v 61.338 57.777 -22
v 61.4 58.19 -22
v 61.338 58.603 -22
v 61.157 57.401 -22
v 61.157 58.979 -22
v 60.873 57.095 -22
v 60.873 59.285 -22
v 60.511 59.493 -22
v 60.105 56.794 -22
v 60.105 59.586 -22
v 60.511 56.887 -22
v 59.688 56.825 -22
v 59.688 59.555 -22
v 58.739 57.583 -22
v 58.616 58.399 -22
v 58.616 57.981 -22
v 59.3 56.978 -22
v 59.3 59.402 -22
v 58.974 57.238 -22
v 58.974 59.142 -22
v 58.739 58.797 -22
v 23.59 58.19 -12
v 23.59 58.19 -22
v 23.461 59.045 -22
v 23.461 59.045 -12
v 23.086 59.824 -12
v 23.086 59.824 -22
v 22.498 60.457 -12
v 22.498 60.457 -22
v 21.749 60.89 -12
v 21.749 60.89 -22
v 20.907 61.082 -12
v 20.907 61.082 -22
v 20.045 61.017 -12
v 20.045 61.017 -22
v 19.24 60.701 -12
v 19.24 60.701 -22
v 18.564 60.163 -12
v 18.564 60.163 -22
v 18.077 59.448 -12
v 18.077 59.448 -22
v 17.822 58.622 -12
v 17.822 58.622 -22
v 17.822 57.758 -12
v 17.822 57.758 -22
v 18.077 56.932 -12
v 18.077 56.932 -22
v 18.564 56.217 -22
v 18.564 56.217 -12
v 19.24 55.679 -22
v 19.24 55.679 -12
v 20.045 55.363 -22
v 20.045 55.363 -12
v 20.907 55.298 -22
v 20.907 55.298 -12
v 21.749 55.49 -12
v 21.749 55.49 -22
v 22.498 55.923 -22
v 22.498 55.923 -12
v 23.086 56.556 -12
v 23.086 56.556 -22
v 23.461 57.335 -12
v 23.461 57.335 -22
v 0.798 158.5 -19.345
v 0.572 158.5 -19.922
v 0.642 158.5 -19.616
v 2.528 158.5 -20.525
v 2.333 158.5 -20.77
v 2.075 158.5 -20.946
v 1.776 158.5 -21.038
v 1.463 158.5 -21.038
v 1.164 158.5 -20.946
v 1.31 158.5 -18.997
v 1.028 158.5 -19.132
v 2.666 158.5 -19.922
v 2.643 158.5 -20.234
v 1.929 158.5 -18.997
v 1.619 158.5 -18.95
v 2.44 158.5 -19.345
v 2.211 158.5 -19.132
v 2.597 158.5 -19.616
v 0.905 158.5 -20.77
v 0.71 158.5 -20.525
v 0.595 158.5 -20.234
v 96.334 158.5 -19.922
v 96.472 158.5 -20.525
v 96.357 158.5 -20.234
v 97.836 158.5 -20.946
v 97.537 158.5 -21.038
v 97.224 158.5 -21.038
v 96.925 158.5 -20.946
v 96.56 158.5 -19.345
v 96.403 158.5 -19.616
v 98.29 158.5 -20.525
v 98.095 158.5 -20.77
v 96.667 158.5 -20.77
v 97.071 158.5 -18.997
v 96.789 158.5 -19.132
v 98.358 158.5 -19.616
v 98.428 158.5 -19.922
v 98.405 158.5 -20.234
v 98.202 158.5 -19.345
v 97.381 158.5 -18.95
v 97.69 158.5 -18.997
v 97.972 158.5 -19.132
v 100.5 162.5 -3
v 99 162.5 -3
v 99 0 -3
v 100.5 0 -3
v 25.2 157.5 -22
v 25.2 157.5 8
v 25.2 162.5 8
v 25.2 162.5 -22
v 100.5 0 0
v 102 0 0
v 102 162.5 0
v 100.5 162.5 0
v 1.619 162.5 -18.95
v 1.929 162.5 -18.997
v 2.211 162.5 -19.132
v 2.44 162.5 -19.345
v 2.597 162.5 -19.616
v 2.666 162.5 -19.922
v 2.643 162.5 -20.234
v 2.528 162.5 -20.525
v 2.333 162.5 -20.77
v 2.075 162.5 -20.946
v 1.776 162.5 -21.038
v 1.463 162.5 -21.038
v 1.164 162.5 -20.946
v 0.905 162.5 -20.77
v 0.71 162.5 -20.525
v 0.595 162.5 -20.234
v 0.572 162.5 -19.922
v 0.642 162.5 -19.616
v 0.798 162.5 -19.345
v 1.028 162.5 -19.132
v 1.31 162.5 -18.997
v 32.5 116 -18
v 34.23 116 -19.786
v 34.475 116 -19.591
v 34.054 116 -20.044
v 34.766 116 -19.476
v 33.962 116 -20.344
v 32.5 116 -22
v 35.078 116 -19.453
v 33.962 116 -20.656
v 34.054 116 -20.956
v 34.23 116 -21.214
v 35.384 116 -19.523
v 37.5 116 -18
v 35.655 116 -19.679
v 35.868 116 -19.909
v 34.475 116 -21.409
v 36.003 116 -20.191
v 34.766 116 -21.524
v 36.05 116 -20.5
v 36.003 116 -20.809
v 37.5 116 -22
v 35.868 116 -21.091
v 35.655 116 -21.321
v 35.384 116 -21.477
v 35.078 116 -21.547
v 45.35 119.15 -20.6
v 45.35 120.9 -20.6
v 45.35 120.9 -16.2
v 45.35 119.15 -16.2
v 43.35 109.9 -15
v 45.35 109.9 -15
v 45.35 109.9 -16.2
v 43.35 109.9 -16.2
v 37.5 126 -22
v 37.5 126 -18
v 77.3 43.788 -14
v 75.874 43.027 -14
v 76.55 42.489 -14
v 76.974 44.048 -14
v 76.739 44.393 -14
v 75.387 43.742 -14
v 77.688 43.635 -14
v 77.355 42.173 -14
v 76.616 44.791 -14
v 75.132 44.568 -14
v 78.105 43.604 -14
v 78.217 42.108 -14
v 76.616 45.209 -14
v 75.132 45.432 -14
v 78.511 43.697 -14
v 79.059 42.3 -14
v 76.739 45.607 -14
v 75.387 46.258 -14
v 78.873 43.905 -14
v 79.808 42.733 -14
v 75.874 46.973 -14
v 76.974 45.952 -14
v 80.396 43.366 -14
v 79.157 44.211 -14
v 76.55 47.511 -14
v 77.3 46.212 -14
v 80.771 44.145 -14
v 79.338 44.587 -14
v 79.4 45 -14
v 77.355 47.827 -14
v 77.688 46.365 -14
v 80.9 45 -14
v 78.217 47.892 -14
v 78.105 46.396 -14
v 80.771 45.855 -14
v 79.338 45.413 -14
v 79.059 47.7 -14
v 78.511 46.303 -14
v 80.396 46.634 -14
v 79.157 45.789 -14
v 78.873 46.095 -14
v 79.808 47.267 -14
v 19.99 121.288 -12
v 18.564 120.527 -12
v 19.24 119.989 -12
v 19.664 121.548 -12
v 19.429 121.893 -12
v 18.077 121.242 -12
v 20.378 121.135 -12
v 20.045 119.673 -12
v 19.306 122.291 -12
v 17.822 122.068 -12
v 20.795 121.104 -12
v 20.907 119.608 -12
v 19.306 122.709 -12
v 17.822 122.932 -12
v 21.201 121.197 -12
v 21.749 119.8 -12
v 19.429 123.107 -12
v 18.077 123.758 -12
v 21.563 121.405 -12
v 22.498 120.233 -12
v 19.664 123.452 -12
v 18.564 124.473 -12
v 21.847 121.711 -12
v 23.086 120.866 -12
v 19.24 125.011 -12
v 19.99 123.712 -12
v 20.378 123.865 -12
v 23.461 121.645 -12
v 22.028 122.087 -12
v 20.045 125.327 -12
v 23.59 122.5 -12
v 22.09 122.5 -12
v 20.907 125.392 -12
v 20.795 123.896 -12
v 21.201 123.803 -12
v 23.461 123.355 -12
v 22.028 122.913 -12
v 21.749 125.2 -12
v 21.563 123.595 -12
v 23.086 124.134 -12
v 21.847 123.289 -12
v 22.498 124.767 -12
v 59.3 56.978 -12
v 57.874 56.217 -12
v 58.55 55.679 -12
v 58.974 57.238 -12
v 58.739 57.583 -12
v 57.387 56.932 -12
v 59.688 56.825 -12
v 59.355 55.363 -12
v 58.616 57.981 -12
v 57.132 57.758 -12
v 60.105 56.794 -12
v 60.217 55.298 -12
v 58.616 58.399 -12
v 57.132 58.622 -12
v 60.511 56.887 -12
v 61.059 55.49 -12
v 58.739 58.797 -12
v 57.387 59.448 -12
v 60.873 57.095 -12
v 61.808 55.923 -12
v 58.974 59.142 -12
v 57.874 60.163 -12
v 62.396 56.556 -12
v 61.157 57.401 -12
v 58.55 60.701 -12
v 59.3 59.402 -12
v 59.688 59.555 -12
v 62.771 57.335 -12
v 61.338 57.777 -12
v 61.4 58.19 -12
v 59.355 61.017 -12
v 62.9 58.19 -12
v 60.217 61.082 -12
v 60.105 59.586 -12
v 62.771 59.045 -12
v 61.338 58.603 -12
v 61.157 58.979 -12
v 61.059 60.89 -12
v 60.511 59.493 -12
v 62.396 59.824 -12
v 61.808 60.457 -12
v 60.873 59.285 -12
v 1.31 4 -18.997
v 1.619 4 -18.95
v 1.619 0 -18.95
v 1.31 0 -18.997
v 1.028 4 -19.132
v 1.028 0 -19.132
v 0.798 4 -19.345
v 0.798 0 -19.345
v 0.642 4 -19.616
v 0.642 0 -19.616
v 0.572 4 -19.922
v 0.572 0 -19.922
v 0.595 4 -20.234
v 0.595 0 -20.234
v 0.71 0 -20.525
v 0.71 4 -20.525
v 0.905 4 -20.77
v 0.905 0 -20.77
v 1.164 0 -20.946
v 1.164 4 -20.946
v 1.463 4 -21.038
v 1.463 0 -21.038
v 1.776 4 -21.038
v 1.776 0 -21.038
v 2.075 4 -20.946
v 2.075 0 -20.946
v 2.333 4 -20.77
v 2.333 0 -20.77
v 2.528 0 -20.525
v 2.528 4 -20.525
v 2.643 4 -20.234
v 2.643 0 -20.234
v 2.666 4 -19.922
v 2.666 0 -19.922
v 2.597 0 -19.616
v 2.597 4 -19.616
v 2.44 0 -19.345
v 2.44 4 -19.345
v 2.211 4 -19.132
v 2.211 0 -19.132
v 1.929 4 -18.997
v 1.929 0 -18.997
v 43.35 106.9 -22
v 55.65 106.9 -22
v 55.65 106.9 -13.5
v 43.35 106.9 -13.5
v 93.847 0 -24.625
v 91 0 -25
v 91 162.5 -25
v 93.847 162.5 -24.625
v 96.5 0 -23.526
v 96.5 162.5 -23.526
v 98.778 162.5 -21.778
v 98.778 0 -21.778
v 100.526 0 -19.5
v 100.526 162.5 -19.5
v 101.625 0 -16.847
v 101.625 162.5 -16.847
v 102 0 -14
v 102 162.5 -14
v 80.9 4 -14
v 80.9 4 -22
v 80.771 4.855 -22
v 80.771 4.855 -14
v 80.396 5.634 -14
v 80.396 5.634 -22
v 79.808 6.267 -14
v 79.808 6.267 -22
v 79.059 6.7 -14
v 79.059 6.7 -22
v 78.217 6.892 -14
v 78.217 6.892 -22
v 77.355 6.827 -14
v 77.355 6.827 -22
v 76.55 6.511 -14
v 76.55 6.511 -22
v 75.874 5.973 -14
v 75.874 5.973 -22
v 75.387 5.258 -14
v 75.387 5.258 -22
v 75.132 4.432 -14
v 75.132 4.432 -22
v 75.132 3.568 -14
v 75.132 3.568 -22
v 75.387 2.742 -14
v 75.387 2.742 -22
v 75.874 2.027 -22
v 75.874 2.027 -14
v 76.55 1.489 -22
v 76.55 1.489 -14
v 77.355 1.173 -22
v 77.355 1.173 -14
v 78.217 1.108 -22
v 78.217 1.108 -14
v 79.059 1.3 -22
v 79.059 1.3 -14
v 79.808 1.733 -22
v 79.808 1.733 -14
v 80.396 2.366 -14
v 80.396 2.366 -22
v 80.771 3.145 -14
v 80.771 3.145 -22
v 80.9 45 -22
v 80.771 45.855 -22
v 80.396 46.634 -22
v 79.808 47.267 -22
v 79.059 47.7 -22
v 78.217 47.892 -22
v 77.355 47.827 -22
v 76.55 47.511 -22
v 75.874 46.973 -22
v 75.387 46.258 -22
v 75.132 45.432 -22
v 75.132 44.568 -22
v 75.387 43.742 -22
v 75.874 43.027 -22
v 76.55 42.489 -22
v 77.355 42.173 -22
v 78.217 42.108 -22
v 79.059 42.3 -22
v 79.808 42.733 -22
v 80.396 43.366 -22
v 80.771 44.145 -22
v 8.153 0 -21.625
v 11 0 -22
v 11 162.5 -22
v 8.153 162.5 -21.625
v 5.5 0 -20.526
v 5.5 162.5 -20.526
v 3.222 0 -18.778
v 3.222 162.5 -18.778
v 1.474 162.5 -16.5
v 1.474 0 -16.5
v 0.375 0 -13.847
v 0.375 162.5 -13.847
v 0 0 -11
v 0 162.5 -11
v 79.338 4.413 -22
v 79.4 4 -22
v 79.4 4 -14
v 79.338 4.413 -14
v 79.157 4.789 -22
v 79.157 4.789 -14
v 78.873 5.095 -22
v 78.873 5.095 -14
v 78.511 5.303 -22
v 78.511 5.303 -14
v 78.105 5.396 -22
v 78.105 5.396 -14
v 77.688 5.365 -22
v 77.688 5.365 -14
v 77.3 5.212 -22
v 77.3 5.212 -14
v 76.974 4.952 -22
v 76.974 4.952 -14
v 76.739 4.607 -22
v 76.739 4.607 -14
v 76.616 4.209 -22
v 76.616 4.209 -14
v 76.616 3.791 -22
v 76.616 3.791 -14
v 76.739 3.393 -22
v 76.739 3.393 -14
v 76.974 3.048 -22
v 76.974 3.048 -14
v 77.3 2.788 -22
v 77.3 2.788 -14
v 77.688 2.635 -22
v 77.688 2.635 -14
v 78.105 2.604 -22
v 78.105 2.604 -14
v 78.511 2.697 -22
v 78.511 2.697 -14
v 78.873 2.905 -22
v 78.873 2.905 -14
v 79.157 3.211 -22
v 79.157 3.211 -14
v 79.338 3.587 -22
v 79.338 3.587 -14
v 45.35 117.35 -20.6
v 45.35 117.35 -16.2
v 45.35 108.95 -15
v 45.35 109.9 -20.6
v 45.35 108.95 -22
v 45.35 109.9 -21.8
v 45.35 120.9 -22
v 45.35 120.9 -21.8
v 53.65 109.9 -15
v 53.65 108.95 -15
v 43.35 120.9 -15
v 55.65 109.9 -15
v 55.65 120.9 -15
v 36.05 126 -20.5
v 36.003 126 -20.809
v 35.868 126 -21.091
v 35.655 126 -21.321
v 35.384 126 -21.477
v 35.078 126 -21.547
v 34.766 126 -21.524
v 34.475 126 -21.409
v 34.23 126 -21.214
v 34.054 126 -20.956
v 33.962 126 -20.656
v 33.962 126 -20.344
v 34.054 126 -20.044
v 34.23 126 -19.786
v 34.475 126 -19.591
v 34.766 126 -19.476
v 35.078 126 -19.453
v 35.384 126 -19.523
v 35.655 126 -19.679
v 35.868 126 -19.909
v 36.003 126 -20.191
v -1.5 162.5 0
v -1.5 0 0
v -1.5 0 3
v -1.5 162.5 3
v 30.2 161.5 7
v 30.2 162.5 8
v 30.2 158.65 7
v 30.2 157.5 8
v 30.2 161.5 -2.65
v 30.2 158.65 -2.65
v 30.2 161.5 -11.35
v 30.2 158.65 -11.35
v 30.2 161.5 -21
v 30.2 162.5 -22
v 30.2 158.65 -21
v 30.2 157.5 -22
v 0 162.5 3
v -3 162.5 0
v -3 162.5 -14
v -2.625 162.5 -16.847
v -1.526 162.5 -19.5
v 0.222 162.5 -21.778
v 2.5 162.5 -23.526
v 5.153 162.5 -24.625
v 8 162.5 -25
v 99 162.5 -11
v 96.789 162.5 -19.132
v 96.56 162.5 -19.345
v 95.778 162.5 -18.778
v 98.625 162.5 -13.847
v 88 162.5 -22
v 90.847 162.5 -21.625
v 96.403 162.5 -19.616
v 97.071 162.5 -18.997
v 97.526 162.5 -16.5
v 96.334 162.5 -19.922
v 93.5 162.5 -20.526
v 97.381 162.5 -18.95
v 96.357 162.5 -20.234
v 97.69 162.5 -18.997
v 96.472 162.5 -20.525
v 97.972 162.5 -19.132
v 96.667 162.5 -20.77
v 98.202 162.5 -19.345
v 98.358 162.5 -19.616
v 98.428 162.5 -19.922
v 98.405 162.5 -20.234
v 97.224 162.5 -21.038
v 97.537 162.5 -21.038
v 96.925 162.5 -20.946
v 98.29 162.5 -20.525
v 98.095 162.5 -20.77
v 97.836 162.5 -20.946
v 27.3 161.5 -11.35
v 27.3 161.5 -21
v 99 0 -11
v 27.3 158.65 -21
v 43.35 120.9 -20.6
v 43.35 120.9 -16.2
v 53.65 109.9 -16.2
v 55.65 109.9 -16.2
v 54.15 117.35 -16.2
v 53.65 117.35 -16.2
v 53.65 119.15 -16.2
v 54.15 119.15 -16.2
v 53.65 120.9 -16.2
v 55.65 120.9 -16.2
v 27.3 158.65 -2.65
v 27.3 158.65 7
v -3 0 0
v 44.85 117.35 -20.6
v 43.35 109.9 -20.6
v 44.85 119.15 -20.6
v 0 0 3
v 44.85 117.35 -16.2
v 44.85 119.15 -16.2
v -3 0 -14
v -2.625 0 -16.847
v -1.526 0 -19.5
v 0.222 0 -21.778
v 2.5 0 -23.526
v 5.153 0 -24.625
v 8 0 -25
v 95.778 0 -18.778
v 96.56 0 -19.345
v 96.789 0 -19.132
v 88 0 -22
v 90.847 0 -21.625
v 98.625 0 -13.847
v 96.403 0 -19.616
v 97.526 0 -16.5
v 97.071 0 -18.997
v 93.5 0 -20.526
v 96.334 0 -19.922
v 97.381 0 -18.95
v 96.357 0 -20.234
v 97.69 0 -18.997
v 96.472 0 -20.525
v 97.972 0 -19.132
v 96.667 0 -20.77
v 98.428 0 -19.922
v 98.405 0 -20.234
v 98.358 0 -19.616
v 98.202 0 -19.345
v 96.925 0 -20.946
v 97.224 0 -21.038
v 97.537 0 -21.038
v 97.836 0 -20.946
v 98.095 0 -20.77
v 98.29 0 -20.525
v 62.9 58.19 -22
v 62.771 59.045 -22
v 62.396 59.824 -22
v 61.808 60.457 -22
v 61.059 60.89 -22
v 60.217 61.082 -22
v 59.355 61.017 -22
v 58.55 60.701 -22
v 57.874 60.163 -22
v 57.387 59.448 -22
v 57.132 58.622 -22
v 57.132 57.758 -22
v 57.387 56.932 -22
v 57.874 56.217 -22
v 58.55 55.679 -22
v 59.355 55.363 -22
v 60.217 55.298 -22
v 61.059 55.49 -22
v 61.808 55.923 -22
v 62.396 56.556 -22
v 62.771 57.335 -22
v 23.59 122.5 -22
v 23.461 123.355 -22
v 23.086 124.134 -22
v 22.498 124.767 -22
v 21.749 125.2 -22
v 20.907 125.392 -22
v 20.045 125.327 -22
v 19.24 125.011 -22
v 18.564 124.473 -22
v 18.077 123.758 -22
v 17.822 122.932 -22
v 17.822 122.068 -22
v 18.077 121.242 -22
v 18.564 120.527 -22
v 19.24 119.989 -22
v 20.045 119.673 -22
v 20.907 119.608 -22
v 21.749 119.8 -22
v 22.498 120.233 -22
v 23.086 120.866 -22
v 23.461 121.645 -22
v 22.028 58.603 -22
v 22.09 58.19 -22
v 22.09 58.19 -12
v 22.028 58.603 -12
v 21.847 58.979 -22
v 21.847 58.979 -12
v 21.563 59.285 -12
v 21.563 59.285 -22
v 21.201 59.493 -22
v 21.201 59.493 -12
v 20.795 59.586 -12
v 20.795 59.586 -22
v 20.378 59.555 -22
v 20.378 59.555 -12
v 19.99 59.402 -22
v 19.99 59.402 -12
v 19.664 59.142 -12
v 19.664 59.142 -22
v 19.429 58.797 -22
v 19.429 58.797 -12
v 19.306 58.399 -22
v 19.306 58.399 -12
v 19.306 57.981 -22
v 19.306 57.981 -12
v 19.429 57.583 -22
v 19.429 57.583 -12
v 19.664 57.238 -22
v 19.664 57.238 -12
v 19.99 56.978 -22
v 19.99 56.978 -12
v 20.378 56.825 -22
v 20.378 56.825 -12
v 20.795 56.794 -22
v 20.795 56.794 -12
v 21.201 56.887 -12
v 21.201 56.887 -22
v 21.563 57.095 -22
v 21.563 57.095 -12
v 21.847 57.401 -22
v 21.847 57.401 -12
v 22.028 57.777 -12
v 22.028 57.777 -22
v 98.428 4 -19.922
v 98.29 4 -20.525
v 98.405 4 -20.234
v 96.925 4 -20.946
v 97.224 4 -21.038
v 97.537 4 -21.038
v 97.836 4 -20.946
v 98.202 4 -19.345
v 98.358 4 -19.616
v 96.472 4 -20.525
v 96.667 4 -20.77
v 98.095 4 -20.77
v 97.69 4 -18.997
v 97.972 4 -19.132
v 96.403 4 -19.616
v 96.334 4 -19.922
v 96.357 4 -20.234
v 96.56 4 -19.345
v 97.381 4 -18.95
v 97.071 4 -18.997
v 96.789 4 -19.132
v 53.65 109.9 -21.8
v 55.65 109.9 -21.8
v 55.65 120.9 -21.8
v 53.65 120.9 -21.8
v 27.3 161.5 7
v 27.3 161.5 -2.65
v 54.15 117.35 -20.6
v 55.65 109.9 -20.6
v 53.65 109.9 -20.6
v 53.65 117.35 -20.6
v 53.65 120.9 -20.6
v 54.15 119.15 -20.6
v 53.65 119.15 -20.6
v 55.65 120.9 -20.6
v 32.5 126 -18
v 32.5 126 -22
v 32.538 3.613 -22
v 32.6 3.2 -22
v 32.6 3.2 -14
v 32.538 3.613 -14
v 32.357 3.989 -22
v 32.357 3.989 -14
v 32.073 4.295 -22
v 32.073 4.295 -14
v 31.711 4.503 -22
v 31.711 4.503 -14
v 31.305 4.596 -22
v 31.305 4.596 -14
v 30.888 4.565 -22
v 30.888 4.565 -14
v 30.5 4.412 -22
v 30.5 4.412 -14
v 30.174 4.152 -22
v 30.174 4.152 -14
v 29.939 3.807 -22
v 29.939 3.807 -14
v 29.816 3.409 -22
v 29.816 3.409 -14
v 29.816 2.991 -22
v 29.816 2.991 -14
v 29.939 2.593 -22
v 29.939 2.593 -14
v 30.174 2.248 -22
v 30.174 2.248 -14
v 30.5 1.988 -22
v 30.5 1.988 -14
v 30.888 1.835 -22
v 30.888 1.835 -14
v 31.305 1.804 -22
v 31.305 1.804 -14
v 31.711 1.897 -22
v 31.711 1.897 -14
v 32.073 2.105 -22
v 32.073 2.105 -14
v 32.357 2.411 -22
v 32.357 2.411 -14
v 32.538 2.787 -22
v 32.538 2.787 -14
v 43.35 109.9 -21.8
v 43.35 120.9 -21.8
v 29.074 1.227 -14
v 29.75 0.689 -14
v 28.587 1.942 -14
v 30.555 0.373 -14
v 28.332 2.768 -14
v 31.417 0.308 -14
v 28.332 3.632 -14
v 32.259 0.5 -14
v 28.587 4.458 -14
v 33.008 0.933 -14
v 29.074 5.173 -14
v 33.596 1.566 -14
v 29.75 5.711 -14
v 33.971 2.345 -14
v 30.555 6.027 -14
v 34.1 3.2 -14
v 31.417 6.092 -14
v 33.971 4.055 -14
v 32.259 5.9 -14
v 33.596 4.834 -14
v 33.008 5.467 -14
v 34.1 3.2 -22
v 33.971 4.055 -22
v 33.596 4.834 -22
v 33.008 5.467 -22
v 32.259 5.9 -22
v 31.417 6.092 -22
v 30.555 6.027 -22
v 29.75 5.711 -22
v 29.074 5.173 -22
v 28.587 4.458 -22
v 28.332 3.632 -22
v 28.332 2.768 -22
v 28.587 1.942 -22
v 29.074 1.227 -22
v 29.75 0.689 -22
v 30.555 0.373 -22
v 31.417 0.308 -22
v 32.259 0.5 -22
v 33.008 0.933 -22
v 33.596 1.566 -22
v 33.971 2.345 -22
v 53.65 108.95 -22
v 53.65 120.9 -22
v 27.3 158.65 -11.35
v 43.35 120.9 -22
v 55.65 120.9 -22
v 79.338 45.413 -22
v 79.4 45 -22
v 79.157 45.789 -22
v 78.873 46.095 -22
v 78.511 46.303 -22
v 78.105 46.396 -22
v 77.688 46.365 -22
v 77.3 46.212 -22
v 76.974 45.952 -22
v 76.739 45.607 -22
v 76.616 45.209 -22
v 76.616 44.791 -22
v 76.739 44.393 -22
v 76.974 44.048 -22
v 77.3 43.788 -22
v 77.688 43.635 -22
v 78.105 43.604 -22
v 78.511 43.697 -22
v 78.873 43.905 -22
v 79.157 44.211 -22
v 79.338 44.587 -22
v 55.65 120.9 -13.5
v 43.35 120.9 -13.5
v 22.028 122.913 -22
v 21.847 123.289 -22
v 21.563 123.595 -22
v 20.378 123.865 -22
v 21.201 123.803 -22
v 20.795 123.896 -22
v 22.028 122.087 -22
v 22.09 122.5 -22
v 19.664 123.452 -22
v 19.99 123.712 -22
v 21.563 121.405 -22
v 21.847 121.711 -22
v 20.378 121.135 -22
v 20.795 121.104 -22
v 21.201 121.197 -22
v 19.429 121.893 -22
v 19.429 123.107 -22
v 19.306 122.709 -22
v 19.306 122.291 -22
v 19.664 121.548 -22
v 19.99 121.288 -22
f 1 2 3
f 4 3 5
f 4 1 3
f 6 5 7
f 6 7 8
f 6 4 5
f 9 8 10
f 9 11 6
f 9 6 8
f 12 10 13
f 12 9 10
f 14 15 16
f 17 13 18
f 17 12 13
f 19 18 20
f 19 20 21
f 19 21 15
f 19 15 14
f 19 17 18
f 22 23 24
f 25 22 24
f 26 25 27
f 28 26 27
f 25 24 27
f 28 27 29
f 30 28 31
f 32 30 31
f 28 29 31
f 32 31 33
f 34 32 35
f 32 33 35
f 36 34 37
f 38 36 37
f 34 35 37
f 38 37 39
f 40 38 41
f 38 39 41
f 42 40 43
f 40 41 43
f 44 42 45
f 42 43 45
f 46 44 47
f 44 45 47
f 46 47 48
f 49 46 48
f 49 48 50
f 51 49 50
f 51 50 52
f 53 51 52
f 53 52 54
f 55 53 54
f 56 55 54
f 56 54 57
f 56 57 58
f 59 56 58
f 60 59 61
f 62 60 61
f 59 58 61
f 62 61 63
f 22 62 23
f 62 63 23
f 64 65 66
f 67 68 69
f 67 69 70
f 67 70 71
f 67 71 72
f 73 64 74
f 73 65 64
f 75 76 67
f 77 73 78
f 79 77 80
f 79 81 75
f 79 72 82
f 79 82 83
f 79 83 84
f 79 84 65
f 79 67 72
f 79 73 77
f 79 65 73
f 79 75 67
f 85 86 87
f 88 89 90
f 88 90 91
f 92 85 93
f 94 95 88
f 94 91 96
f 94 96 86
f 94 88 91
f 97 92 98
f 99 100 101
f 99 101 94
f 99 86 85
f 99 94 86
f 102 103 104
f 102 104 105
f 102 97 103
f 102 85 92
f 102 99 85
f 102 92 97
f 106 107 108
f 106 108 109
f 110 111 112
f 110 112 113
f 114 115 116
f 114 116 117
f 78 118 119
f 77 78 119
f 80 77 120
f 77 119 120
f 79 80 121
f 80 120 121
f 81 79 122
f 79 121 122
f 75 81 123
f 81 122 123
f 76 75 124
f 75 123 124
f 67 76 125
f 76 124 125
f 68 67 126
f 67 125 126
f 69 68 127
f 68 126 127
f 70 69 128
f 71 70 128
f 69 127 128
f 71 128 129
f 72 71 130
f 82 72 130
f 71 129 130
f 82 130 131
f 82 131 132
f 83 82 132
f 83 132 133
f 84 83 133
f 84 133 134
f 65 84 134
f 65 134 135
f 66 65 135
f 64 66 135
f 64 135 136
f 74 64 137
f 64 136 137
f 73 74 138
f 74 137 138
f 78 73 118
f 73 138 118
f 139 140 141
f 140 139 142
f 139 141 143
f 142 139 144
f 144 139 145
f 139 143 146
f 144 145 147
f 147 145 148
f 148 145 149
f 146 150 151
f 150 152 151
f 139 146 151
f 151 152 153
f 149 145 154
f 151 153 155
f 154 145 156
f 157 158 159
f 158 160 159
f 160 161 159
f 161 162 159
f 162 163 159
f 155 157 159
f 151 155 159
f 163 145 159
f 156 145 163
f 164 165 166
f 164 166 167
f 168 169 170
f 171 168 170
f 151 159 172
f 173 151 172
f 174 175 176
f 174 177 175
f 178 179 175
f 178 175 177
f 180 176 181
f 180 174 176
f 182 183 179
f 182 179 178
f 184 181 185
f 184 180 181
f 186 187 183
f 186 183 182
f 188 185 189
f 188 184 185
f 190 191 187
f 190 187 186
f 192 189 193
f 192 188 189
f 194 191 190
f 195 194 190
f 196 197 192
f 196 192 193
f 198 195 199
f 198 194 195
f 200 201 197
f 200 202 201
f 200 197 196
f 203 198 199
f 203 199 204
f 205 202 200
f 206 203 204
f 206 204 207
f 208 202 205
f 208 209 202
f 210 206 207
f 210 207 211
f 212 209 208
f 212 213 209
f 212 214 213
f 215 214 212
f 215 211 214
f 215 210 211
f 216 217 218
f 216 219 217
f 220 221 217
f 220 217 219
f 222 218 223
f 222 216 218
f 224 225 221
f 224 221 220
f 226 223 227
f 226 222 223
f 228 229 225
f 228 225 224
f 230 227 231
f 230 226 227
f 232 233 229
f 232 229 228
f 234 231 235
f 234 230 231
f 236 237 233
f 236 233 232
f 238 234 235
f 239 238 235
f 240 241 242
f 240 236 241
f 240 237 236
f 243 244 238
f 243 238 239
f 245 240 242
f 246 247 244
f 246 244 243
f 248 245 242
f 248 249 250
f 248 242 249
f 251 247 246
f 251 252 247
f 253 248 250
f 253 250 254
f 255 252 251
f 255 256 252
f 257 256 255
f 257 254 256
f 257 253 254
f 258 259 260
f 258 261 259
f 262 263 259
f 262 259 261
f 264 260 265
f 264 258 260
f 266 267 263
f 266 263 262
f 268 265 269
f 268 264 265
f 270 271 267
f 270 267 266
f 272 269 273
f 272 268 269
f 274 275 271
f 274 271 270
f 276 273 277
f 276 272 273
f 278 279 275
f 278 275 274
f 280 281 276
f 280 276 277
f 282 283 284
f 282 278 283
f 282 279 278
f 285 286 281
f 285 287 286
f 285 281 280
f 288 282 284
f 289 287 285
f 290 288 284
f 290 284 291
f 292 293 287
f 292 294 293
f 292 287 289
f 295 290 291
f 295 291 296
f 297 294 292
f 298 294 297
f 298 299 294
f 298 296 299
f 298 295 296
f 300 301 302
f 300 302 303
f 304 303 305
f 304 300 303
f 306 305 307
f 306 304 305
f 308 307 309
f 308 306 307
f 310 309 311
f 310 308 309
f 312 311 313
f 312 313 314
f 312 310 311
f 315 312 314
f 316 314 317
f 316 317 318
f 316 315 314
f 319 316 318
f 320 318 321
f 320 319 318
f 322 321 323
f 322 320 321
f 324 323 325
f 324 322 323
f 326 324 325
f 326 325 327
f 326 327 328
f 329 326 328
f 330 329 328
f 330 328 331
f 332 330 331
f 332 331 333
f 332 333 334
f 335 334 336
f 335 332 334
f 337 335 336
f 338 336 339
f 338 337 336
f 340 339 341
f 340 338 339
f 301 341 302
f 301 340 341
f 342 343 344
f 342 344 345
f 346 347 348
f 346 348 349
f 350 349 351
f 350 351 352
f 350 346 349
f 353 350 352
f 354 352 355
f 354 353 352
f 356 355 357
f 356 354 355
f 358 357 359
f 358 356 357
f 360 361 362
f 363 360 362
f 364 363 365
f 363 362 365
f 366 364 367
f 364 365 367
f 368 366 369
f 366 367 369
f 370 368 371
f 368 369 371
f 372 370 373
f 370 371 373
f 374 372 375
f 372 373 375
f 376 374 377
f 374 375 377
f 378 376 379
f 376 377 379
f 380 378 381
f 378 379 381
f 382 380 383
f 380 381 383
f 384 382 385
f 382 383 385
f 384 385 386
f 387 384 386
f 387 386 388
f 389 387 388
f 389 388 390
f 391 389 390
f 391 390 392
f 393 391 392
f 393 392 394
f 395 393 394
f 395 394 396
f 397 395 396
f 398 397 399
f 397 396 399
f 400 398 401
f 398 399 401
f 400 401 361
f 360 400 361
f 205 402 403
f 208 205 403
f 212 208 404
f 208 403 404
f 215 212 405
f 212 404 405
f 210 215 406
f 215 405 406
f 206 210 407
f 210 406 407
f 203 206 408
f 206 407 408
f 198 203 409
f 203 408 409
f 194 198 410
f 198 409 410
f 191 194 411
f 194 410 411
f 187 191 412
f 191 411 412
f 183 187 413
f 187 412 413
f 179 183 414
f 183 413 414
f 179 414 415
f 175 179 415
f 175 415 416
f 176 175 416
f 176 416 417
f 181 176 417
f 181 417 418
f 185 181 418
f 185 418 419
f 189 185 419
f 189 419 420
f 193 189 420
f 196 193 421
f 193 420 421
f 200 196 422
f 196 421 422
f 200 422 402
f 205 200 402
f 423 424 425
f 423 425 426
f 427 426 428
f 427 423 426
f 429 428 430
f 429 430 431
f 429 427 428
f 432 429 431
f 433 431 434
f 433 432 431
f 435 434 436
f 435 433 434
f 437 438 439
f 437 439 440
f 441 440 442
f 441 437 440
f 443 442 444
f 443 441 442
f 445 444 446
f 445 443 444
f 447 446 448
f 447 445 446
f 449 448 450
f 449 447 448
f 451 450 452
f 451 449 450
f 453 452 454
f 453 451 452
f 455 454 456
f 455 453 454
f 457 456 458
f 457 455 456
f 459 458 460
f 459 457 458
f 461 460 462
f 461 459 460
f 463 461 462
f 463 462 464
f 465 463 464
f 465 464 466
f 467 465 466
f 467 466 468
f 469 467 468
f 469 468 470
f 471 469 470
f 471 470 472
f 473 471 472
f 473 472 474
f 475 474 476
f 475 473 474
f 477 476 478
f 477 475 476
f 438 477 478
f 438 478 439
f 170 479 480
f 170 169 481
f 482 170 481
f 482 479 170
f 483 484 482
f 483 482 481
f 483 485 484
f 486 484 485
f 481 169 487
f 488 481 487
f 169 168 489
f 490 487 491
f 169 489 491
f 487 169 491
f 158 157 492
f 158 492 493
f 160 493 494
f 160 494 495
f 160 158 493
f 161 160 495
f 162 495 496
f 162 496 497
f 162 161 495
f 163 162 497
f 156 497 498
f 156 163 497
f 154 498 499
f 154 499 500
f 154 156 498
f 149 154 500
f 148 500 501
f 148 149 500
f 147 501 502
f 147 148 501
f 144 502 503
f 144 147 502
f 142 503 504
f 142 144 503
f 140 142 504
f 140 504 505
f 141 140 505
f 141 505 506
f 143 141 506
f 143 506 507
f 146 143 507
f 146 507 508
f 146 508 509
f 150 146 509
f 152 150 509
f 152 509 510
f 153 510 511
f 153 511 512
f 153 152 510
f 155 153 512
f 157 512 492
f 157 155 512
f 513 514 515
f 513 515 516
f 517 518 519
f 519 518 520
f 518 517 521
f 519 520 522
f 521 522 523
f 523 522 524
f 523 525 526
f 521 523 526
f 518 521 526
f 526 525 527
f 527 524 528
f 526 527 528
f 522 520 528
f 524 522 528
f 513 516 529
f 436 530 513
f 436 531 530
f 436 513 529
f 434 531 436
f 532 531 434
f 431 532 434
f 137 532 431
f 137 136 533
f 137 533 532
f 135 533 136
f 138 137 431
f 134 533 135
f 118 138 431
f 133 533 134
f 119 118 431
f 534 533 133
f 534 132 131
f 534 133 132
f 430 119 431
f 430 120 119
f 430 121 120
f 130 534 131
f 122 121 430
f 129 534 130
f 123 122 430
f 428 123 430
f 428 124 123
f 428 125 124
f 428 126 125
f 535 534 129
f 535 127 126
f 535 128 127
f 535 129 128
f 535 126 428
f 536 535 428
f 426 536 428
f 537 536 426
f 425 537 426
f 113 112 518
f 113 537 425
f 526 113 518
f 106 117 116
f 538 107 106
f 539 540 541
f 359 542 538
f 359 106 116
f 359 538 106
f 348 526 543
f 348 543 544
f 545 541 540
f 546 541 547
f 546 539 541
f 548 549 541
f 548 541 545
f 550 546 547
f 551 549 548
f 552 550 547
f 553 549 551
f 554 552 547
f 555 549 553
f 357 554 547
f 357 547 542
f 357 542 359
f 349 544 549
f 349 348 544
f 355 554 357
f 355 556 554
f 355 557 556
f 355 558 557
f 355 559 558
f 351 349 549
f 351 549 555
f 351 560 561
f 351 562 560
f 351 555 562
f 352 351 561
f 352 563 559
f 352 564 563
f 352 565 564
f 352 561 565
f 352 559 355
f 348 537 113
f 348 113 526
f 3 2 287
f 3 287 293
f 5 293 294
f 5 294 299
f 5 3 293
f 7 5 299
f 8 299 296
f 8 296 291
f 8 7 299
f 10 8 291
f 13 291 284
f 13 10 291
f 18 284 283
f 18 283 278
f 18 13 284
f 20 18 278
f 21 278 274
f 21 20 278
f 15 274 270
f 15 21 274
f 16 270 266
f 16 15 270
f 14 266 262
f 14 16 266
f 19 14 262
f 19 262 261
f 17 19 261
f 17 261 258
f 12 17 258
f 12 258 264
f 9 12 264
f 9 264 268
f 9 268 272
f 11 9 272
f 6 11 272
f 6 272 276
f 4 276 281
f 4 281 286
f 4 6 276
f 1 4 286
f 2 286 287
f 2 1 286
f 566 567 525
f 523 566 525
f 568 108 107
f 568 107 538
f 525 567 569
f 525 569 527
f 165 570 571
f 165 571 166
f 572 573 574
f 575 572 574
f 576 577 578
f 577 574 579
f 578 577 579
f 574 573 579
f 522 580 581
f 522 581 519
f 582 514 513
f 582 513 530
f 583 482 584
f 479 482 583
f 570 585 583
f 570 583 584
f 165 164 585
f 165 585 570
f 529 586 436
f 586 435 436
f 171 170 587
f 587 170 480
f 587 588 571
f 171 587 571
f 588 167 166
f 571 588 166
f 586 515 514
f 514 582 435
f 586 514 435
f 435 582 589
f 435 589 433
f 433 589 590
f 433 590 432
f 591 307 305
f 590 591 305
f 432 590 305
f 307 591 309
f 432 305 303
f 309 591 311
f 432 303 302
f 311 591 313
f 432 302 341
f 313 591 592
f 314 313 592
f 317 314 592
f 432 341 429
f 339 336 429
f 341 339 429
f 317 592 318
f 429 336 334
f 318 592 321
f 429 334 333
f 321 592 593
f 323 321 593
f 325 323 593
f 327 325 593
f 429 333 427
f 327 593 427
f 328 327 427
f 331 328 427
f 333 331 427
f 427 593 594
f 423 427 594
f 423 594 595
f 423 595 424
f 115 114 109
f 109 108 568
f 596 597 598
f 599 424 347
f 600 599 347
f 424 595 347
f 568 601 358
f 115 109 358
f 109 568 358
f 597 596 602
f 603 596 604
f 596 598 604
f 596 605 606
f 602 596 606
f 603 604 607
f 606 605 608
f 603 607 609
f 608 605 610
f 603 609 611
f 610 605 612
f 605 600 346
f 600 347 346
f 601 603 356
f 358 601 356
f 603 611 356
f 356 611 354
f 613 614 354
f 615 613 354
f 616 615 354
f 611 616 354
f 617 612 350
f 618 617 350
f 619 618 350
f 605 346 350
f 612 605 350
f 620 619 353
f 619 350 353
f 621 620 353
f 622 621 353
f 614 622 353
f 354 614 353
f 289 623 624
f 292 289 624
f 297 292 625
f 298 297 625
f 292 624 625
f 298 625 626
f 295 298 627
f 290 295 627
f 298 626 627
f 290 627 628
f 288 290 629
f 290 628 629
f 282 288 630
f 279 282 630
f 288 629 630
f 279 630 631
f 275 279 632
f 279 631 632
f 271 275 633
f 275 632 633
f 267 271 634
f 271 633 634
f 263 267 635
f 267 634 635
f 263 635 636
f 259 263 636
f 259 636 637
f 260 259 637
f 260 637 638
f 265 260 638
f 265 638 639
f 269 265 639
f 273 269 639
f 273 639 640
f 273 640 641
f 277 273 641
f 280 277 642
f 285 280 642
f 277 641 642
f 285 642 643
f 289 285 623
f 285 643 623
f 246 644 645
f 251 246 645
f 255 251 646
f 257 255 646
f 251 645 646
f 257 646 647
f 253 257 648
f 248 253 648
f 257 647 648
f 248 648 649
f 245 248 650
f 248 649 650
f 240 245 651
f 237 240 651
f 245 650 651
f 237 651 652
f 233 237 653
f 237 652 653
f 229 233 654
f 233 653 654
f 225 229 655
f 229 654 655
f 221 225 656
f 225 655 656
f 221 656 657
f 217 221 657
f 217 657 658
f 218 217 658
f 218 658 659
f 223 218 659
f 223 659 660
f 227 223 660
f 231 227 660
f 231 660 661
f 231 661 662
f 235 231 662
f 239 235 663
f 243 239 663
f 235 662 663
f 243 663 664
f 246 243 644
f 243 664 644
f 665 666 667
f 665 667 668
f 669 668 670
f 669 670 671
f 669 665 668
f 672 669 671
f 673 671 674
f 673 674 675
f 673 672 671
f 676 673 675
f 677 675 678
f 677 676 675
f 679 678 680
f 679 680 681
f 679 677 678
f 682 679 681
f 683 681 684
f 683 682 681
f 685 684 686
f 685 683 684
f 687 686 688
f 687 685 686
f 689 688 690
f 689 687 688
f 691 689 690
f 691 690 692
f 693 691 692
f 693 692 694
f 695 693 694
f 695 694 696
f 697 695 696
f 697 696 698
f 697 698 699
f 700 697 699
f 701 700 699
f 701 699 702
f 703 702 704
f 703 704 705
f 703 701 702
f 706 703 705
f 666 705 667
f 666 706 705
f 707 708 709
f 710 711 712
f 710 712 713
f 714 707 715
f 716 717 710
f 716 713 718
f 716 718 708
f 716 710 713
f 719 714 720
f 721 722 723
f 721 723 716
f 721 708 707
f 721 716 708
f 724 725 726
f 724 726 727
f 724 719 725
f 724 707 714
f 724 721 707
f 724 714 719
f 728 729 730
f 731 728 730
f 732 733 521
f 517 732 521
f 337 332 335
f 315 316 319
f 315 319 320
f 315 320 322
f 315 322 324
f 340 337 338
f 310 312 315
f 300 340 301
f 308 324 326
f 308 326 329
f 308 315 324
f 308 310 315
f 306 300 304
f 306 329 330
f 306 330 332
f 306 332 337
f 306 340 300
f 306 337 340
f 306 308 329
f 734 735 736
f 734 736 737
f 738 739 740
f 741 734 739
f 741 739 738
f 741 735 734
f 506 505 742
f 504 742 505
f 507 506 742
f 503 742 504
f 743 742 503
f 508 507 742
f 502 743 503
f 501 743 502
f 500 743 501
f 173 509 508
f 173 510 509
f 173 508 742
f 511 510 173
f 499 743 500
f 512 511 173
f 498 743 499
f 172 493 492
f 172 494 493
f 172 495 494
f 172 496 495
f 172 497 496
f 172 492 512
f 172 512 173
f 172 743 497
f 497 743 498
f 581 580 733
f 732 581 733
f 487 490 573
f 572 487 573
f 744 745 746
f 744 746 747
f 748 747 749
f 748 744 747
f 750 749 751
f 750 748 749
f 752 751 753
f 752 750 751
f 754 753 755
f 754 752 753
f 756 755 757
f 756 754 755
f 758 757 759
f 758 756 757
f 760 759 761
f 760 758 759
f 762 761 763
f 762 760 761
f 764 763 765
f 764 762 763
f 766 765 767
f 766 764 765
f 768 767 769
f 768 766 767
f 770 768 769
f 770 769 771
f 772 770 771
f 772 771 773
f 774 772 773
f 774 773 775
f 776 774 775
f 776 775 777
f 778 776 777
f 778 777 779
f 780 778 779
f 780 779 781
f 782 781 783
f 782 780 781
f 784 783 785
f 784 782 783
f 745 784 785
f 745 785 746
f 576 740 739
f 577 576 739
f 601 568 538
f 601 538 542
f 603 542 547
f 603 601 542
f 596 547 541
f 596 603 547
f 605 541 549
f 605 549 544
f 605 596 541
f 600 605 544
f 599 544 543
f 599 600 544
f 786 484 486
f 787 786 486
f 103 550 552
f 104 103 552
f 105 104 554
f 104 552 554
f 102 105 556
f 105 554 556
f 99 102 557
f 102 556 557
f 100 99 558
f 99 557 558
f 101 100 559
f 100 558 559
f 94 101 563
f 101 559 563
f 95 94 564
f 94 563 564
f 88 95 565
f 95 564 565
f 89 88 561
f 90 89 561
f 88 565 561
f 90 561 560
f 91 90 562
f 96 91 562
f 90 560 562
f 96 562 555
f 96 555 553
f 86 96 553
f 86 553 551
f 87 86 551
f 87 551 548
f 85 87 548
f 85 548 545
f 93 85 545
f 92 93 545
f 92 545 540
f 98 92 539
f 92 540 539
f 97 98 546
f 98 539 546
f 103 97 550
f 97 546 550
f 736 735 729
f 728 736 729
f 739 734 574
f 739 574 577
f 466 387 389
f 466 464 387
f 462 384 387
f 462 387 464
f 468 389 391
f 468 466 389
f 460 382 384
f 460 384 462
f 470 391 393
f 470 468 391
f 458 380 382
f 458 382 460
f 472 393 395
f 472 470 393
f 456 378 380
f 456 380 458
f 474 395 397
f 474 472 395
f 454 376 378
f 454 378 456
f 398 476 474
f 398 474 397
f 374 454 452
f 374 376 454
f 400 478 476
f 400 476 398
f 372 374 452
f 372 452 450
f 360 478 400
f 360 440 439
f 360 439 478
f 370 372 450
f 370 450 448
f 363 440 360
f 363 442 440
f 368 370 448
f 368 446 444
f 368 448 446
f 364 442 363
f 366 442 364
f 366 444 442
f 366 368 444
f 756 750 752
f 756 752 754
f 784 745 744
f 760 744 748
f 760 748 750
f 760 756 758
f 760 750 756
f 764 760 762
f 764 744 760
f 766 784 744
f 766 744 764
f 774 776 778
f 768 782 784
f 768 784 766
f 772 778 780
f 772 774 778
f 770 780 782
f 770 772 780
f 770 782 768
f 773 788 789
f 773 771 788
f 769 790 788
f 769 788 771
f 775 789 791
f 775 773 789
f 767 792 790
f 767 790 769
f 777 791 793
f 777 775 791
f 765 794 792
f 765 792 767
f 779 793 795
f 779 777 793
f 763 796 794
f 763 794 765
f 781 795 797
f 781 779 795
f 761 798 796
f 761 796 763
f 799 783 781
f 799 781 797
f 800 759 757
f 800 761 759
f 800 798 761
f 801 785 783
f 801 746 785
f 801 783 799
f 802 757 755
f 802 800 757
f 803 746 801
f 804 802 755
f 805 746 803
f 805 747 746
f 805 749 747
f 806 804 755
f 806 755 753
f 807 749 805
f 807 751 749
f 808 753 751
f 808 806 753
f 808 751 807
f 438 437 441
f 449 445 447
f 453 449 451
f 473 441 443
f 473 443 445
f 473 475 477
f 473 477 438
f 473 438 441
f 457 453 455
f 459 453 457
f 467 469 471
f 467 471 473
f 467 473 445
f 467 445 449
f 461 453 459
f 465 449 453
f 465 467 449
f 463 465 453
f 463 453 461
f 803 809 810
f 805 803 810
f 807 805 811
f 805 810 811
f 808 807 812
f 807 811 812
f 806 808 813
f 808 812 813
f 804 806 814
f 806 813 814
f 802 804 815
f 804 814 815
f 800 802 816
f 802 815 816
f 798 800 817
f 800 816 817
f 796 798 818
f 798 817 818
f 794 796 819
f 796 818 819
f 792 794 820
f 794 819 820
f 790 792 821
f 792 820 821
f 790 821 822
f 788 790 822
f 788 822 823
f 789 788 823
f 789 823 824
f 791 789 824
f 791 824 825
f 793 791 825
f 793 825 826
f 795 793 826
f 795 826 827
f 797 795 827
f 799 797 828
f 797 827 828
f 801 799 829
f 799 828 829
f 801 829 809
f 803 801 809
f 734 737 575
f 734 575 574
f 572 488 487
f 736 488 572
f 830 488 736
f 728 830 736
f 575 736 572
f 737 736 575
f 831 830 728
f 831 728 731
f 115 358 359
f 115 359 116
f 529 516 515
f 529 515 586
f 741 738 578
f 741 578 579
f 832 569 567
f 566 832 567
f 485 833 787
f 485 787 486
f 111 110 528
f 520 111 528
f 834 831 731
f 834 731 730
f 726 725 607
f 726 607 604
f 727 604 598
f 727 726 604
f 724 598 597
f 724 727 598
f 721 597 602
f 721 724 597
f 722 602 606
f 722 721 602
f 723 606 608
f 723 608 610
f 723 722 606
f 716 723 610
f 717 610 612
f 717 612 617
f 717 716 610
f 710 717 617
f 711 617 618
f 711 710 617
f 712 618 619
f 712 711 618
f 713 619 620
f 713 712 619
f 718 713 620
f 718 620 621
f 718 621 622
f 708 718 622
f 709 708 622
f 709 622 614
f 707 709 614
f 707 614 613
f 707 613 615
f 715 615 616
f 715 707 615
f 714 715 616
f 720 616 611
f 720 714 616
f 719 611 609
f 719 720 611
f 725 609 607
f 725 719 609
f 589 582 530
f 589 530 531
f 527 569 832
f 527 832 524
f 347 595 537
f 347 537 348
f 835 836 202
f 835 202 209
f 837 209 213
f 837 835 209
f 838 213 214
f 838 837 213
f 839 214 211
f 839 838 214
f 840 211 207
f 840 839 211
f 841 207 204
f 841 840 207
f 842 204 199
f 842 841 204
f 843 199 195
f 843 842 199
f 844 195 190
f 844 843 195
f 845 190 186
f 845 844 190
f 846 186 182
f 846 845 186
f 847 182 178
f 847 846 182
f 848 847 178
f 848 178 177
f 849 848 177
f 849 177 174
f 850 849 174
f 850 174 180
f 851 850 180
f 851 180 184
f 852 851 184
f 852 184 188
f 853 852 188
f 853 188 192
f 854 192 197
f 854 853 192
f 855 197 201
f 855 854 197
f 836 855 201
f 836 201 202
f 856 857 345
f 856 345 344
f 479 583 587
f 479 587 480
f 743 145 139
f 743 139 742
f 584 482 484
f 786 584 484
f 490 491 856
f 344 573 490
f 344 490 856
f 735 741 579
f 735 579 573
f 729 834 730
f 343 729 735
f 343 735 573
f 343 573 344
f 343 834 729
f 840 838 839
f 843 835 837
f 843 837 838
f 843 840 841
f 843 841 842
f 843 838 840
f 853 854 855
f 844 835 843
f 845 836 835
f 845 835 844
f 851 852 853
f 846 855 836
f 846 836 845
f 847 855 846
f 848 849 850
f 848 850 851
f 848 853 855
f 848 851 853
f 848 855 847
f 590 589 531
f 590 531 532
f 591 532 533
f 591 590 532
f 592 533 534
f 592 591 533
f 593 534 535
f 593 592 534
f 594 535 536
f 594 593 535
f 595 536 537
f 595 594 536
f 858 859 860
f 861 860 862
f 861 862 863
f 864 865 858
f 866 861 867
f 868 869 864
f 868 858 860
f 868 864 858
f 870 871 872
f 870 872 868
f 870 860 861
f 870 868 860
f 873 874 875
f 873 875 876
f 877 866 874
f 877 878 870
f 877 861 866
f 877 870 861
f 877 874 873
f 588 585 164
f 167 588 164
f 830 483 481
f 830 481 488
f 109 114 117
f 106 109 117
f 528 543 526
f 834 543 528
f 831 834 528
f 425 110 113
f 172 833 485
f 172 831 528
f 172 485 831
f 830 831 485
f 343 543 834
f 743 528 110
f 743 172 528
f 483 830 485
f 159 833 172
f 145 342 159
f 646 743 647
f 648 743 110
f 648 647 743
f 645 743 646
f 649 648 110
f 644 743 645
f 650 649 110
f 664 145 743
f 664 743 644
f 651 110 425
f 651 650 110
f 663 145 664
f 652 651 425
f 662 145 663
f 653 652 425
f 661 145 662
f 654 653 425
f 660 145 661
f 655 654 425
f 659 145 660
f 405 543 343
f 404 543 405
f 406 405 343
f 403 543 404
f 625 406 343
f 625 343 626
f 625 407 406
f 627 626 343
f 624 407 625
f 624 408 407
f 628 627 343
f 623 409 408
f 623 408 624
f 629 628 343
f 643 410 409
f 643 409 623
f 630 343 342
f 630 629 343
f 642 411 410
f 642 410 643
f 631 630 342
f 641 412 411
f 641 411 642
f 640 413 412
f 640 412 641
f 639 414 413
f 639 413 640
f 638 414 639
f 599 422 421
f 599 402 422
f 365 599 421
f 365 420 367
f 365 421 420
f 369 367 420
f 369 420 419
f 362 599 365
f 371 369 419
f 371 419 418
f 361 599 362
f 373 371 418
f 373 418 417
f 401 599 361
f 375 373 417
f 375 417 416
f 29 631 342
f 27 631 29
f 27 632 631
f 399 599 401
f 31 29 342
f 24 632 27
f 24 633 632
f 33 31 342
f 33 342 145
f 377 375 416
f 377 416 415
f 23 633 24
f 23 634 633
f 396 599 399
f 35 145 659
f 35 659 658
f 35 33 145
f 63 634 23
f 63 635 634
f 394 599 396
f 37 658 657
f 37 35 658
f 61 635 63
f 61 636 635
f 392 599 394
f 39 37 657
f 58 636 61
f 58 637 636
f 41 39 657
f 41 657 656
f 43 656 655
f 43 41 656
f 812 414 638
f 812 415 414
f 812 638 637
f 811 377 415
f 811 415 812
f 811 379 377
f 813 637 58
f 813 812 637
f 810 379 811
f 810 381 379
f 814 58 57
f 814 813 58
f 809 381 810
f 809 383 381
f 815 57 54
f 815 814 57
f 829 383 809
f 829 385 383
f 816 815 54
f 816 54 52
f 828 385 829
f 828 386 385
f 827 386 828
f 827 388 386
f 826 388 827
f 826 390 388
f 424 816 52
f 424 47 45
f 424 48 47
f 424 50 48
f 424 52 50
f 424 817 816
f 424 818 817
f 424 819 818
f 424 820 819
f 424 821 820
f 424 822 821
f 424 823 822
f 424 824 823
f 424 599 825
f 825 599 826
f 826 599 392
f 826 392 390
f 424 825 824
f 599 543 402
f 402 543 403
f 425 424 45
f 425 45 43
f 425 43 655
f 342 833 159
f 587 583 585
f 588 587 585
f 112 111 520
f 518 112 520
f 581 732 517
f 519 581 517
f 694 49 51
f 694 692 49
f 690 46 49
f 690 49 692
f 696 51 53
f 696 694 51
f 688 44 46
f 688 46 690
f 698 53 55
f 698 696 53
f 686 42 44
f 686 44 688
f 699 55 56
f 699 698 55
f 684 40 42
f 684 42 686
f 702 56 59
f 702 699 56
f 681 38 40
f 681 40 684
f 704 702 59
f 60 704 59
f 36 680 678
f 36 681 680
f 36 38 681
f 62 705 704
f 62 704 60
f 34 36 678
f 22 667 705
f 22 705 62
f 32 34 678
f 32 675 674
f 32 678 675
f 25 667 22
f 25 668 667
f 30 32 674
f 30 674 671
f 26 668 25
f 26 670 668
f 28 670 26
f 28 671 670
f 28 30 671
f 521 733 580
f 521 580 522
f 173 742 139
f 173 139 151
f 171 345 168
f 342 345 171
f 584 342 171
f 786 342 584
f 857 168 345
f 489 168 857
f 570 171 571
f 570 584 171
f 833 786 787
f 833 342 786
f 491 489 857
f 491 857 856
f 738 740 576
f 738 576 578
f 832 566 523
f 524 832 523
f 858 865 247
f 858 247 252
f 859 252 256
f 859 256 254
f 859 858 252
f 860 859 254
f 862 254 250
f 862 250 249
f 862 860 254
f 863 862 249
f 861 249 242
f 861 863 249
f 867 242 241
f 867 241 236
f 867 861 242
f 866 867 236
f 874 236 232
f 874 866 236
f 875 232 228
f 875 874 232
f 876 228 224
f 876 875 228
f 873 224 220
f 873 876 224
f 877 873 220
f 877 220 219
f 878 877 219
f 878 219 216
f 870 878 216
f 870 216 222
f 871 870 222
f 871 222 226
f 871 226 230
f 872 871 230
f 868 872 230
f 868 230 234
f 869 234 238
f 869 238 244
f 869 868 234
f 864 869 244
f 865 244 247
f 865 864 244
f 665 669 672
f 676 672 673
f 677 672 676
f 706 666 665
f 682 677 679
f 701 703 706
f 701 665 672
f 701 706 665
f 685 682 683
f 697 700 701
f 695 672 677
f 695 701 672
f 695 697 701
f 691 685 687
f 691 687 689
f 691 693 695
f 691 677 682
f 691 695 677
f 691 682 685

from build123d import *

# Parameters (mm, degrees)
EXTRUDE_1_DEPTH       = 162.5
SKETCH_2_W            = 1.5
SKETCH_2_H            = 162.5
EXTRUDE_2_DEPTH       = 3
SKETCH_2_4_W          = 1.5
SKETCH_2_4_H          = 162.5
CUT_EXTRUDE_2_DEPTH   = 3
SKETCH_3_R            = 1.05
CUT_EXTRUDE_3_DEPTH   = 4
CUT_EXTRUDE_START     = -4
SKETCH_4_R            = 1.05
CUT_EXTRUDE_4_DEPTH   = 4
SKETCH_6_R            = 2.9
SKETCH_6_R_2          = 1.4
EXTRUDE_1_2_DEPTH     = 10
SKETCH_7_R            = 2.9
SKETCH_7_R_2          = 1.4
EXTRUDE_2_2_DEPTH     = 8
EXTRUDE_4_DEPTH       = 8.5
CUT_EXTRUDE_6_REACH   = 176.56
SKETCH_13_W           = 1.2
SKETCH_13_H           = 11
EXTRUDE_START         = 1.4
EXTRUDE_5_OUTLINE_W   = 0.5
EXTRUDE_5_OUTLINE_H   = 1.8
EXTRUDE_5_DEPTH       = 4.4
EXTRUDE_5_2_OUTLINE_W = 5
EXTRUDE_5_2_OUTLINE_H = 10
EXTRUDE_5_2_DEPTH     = 4
EXTRUDE_START_2       = 116
EXTRUDE_6_OUTLINE_R   = 1.05
EXTRUDE_6_DEPTH       = 10
EXTRUDE_START_3       = 157.5
EXTRUDE_6_2_OUTLINE_W = 5
EXTRUDE_6_2_OUTLINE_H = 30
EXTRUDE_6_2_DEPTH     = 5
EXTRUDE_START_4       = -7.5
EXTRUDE_7_OUTLINE_W   = 2.9
EXTRUDE_7_OUTLINE_H   = 2.85
EXTRUDE_7_DEPTH       = 9.65
EXTRUDE_START_5       = 10.85
EXTRUDE_7_2_OUTLINE_W = 2.9
EXTRUDE_7_2_OUTLINE_H = 2.85
EXTRUDE_7_2_DEPTH     = 9.65
EXTRUDE_START_6       = -1.5
EXTRUDE_7_3_OUTLINE_W = 8.3
EXTRUDE_7_3_OUTLINE_H = 11.95
EXTRUDE_7_3_DEPTH     = 1.5


# Read off the part's stored shape, not the designer's step: 凸台-拉伸5, 凸台-拉伸6, 凸台-拉伸7
with BuildPart() as part:
    # 草图1 → Extrude 1 (new body)
    with BuildSketch(Plane(origin=(0, 0, 0), x_dir=(1, 0, 0), z_dir=(0, 1, 0))):
        with BuildLine():
            Line((-3, 0), (-3, 14))
            ThreePointArc((-3, 14), (0.221825407, 21.778174593), (8, 25))
            Line((8, 25), (91, 25))
            ThreePointArc((91, 25), (98.778174593, 21.778174593), (102, 14))
            Line((102, 14), (102, 0))
            Line((102, 0), (99, 0))
            Line((99, 0), (99, 11))
            ThreePointArc((99, 11), (95.778174593, 18.778174593), (88, 22))
            Line((88, 22), (11, 22))
            ThreePointArc((11, 22), (3.221825407, 18.778174593), (0, 11))
            Line((0, 11), (0, 0))
            Line((0, 0), (-3, 0))
        make_face()
    extrude(amount=EXTRUDE_1_DEPTH)

    # 草图2 → Extrude 2 (add)
    with BuildSketch(Plane.XY):
        with Locations((-0.75, 81.25)):
            Rectangle(SKETCH_2_W, SKETCH_2_H)
    extrude(amount=EXTRUDE_2_DEPTH)

    # 草图2<4> → 切除-拉伸2 (cut)
    with BuildSketch(Plane.XY):
        with Locations((99.75, 81.25)):
            Rectangle(SKETCH_2_4_W, SKETCH_2_4_H)
    extrude(amount=-CUT_EXTRUDE_2_DEPTH, mode=Mode.SUBTRACT)

    # 草图3 → 切除-拉伸3 (cut)
    with BuildSketch(Plane(origin=(0, 162.5, 0), x_dir=(1, 0, 0), z_dir=(0, 1, 0))):
        with Locations(Location((1.61916848, 20, 0), (0, 0, 270))):
            Circle(SKETCH_3_R)
        with Locations(Location((97.38083152, 20, 0), (0, 0, 270))):
            Circle(SKETCH_3_R)
    extrude(amount=-CUT_EXTRUDE_3_DEPTH, mode=Mode.SUBTRACT)

    # 草图4 → 切除-拉伸4 (cut)
    with BuildSketch(Plane.XZ.offset(CUT_EXTRUDE_START)):
        with Locations(Location((1.61916848, -20, 0), (0, 0, 90))):
            Circle(SKETCH_4_R)
        with Locations(Location((97.38083152, -20, 0), (0, 0, 90))):
            Circle(SKETCH_4_R)
    extrude(amount=CUT_EXTRUDE_4_DEPTH, mode=Mode.SUBTRACT)

    # 草图6 → Extrude 1 2 (add)
    # profile 1 of 3: a face of its own
    with BuildSketch(Plane.XY.offset(-22)):
        with Locations((20.69, 122.5)):
            Circle(SKETCH_6_R)
        with Locations((20.69, 122.5)):
            Circle(SKETCH_6_R_2, mode=Mode.SUBTRACT)
    # profile 2 of 3: a face of its own
    with BuildSketch(Plane.XY.offset(-22)):
        with Locations((20.69, 58.19)):
            Circle(SKETCH_6_R)
        with Locations((20.69, 58.19)):
            Circle(SKETCH_6_R_2, mode=Mode.SUBTRACT)
    # profile 3 of 3: a face of its own
    with BuildSketch(Plane.XY.offset(-22)):
        with Locations((60, 58.19)):
            Circle(SKETCH_6_R)
        with Locations((60, 58.19)):
            Circle(SKETCH_6_R_2, mode=Mode.SUBTRACT)
    extrude(amount=EXTRUDE_1_2_DEPTH)

    # 草图7 → Extrude 2 2 (add)
    # profile 1 of 3: a face of its own
    with BuildSketch(Plane.XY.offset(-22)):
        with Locations((78, 4)):
            Circle(SKETCH_7_R)
        with Locations((78, 4)):
            Circle(SKETCH_7_R_2, mode=Mode.SUBTRACT)
    # profile 2 of 3: a face of its own
    with BuildSketch(Plane.XY.offset(-22)):
        with Locations((31.2, 3.2)):
            Circle(SKETCH_7_R)
        with Locations((31.2, 3.2)):
            Circle(SKETCH_7_R_2, mode=Mode.SUBTRACT)
    # profile 3 of 3: a face of its own
    with BuildSketch(Plane.XY.offset(-22)):
        with Locations((78, 45)):
            Circle(SKETCH_7_R)
        with Locations((78, 45)):
            Circle(SKETCH_7_R_2, mode=Mode.SUBTRACT)
    extrude(amount=EXTRUDE_2_2_DEPTH)

    # 草图12 → 凸台-拉伸4 (add)
    with BuildSketch(Plane.XY.offset(-22)):
        Polygon((45.35, 120.9), (45.35, 108.95), (53.65, 108.95), (53.65, 120.9), (55.65, 120.9), (55.65, 106.9), (43.35, 106.9), (43.35, 120.9), align=None)
    extrude(amount=EXTRUDE_4_DEPTH)

    # 切除-拉伸6: up to this face of the body (flat: up to its plane)
    cut_extrude_6_end = Plane(part.part.faces().sort_by_distance((43.35, 113.9, -17.75))[0])
    # 草图13 → 切除-拉伸6 (cut, up to the picked face)
    with BuildSketch(Plane(origin=(55.65, 0, 0), x_dir=(0, 0, -1), z_dir=(1, 0, 0)), mode=Mode.PRIVATE) as cut_extrude_6_sk1:
        with Locations((15.6, 115.4)):
            Rectangle(SKETCH_13_W, SKETCH_13_H)
    cut_extrude_6_tool1 = split(extrude(cut_extrude_6_sk1.sketch, amount=-CUT_EXTRUDE_6_REACH, mode=Mode.PRIVATE), bisect_by=cut_extrude_6_end, keep=Keep.BOTH, mode=Mode.PRIVATE)
    # 草图13 → 切除-拉伸6 (cut, up to the picked face)
    with BuildSketch(Plane(origin=(55.65, 0, 0), x_dir=(0, 0, -1), z_dir=(1, 0, 0)), mode=Mode.PRIVATE) as cut_extrude_6_sk2:
        with Locations((21.2, 115.4)):
            Rectangle(SKETCH_13_W, SKETCH_13_H)
    cut_extrude_6_tool2 = split(extrude(cut_extrude_6_sk2.sketch, amount=-CUT_EXTRUDE_6_REACH, mode=Mode.PRIVATE), bisect_by=cut_extrude_6_end, keep=Keep.BOTH, mode=Mode.PRIVATE)
    add(cut_extrude_6_tool1.solids().sort_by(Axis((55.65, 115.4, -15.6), (-1, 0, 0)))[0], mode=Mode.SUBTRACT)
    add(cut_extrude_6_tool2.solids().sort_by(Axis((55.65, 115.4, -21.2), (-1, 0, 0)))[0], mode=Mode.SUBTRACT)

    # 凸台-拉伸5 outline → 凸台-拉伸5 (cut)
    with BuildSketch(Plane.XY.offset(-22).offset(EXTRUDE_START)):
        with Locations((53.9, 118.25)):
            Rectangle(EXTRUDE_5_OUTLINE_W, EXTRUDE_5_OUTLINE_H)
        with Locations((45.1, 118.25)):
            Rectangle(EXTRUDE_5_OUTLINE_W, EXTRUDE_5_OUTLINE_H)
    extrude(amount=EXTRUDE_5_DEPTH, mode=Mode.SUBTRACT)

    # Extrude 5 2 outline → Extrude 5 2 (add)
    with BuildSketch(Plane.XY.offset(-22)):
        with Locations((35, 121)):
            Rectangle(EXTRUDE_5_2_OUTLINE_W, EXTRUDE_5_2_OUTLINE_H)
    extrude(amount=EXTRUDE_5_2_DEPTH)

    # 凸台-拉伸6 outline → 凸台-拉伸6 (cut)
    with BuildSketch(Plane(origin=(0, 0, 0), x_dir=(1, 0, 0), z_dir=(0, 1, 0)).offset(EXTRUDE_START_2)):
        with Locations((35, 20.5)):
            Circle(EXTRUDE_6_OUTLINE_R)
    extrude(amount=EXTRUDE_6_DEPTH, mode=Mode.SUBTRACT)

    # Extrude 6 2 outline → Extrude 6 2 (add)
    with BuildSketch(Plane(origin=(0, 0, 0), x_dir=(1, 0, 0), z_dir=(0, 1, 0)).offset(EXTRUDE_START_3)):
        with Locations((27.7, 7)):
            Rectangle(EXTRUDE_6_2_OUTLINE_W, EXTRUDE_6_2_OUTLINE_H)
    extrude(amount=EXTRUDE_6_2_DEPTH)

    # 凸台-拉伸7 outline → 凸台-拉伸7 (cut)
    with BuildSketch(Plane.XY.offset(-13.5).offset(EXTRUDE_START_4)):
        with Locations((28.75, 160.075)):
            Rectangle(EXTRUDE_7_OUTLINE_W, EXTRUDE_7_OUTLINE_H)
    extrude(amount=EXTRUDE_7_DEPTH, mode=Mode.SUBTRACT)

    # Extrude 7 2 outline → Extrude 7 2 (cut)
    with BuildSketch(Plane.XY.offset(-13.5).offset(EXTRUDE_START_5)):
        with Locations((28.75, 160.075)):
            Rectangle(EXTRUDE_7_2_OUTLINE_W, EXTRUDE_7_2_OUTLINE_H)
    extrude(amount=EXTRUDE_7_2_DEPTH, mode=Mode.SUBTRACT)

    # Extrude 7 3 outline → Extrude 7 3 (add)
    with BuildSketch(Plane.XY.offset(-13.5).offset(EXTRUDE_START_6)):
        with Locations((49.5, 114.925)):
            Rectangle(EXTRUDE_7_3_OUTLINE_W, EXTRUDE_7_3_OUTLINE_H)
    extrude(amount=EXTRUDE_7_3_DEPTH)


solid = part.part
